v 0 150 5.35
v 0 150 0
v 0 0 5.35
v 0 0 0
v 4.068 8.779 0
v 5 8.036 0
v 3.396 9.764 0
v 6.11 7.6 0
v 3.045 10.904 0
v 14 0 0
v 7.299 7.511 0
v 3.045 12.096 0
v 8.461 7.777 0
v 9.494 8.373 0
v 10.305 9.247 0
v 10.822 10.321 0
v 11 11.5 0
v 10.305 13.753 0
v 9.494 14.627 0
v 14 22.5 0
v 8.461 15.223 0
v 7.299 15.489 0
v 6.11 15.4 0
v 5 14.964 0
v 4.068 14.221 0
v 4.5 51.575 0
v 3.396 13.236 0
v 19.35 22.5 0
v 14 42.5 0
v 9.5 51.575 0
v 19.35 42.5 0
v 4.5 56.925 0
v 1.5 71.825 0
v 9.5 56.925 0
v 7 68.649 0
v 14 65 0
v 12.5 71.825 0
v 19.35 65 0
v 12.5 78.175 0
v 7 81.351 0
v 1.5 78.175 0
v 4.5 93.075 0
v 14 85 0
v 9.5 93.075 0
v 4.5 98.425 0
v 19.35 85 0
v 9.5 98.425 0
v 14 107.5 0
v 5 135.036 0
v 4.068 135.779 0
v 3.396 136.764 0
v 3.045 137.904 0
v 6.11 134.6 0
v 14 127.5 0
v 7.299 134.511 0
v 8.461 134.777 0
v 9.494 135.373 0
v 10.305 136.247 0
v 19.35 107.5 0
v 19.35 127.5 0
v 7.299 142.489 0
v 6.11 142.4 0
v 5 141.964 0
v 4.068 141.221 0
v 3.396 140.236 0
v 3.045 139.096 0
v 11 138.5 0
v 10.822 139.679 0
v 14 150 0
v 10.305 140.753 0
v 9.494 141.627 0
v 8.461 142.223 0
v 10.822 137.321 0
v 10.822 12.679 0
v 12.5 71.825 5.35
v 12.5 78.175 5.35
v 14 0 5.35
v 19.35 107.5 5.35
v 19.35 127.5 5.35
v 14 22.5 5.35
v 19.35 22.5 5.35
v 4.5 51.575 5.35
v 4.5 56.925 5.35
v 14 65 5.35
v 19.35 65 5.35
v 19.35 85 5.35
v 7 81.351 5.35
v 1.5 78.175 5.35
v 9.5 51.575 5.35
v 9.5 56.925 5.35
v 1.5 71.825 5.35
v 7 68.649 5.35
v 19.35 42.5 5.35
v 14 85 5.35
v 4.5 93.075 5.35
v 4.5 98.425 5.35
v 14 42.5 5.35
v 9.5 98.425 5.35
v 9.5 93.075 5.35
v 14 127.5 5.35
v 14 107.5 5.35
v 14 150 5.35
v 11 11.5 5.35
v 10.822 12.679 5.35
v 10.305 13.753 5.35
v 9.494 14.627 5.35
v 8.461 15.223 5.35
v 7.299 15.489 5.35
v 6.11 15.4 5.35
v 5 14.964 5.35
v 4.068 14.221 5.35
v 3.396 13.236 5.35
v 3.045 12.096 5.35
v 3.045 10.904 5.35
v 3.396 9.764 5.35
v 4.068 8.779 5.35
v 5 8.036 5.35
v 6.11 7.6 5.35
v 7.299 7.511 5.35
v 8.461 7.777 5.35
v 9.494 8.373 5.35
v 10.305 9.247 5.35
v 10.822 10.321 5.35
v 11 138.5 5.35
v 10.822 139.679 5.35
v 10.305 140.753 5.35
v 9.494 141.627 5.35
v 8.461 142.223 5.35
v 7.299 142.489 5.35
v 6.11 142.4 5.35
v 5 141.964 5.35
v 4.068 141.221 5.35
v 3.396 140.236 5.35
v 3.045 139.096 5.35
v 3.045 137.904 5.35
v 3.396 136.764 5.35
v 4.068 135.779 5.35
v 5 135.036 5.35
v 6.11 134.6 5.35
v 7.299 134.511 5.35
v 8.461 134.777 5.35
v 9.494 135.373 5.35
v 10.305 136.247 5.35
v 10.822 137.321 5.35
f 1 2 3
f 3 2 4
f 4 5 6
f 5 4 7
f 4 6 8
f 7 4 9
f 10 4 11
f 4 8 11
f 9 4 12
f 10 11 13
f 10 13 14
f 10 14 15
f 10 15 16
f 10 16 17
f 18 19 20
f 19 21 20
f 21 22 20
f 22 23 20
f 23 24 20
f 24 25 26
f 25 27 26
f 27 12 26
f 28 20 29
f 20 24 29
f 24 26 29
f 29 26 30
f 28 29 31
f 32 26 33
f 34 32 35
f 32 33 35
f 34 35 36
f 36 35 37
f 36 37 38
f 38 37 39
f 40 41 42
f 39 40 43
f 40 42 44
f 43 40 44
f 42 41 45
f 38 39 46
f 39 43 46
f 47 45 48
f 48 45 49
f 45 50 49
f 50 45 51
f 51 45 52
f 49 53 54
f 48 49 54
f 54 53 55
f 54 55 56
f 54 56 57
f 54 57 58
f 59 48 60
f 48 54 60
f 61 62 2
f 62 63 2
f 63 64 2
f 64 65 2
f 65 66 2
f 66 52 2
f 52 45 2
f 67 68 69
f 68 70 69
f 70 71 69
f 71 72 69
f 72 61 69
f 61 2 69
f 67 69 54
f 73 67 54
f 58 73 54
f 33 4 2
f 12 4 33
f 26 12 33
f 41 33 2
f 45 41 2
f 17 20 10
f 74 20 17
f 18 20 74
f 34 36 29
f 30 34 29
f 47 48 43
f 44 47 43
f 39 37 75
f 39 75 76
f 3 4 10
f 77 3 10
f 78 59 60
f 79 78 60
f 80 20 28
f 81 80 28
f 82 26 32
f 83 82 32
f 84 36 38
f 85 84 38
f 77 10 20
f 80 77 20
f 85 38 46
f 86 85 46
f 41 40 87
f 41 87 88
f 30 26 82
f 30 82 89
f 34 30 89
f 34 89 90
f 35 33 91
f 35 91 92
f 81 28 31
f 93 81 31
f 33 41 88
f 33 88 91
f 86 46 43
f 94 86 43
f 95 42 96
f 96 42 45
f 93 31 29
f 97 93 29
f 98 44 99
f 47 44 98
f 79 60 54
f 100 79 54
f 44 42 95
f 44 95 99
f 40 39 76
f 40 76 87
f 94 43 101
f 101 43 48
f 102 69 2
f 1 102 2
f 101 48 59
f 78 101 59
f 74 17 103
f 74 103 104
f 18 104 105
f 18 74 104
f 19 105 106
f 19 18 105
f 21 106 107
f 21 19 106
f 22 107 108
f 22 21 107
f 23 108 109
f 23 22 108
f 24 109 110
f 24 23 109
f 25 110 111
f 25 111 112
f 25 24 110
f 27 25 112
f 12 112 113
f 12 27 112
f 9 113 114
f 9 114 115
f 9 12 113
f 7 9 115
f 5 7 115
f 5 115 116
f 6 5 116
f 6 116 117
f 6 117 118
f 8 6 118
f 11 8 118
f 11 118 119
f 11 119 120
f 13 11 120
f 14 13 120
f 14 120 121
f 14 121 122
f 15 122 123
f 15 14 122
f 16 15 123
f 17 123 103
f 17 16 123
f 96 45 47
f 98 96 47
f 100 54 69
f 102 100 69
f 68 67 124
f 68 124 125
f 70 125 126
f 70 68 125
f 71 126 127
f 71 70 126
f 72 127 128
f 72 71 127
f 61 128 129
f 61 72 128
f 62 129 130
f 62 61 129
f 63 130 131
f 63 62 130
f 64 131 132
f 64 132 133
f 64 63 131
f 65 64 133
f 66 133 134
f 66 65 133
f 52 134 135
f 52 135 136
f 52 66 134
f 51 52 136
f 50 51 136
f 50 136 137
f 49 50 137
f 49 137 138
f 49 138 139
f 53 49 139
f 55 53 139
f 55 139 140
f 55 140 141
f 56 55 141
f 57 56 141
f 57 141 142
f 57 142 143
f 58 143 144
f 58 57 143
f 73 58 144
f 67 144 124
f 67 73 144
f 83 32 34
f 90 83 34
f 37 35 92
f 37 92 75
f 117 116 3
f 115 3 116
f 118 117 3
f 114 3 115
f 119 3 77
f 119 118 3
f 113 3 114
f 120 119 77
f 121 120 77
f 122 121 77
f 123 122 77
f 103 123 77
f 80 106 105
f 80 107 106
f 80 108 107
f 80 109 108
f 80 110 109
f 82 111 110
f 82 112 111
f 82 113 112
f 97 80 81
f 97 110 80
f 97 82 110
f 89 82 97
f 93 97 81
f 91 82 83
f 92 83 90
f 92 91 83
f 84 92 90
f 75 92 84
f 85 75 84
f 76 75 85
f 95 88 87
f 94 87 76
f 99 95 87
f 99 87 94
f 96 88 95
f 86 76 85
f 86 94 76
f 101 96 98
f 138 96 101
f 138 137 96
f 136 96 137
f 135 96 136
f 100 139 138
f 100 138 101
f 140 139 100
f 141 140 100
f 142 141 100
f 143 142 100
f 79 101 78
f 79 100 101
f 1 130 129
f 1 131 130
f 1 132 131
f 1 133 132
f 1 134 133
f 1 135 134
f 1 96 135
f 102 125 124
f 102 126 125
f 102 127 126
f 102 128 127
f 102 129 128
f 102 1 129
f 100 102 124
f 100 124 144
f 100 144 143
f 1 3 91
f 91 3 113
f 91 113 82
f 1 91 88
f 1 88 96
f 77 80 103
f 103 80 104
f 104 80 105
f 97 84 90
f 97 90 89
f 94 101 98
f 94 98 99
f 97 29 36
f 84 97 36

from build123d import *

# Parameters (mm, degrees)
MODEL_R             = 4
MODEL_W             = 4.999999889
MODEL_H             = 5.349997431
MODEL_H_2           = 5.350001156
BOSS_EXTRUDE1_DEPTH = 5.35


with BuildPart() as part:
    # Model → Boss-Extrude1 (new body)
    with BuildSketch(Plane.XY):
        Polygon((14.000000432, 127.499997616), (14.000000432, 150.00000596), (0, 150.00000596), (0, 0), (14.000000432, 0), (14.000000432, 22.500000894), (19.349999726, 22.500000894), (19.349999726, 42.500000447), (14.000000432, 42.500000447), (14.000000432, 64.999997616), (19.349999726, 64.999997616), (19.349999726, 85.000000894), (14.000000432, 85.000000894), (14.000000432, 107.500001788), (19.349999726, 107.500001788), (19.349999726, 127.499997616), align=None)
        with Locations((7, 11.5)):
            Circle(MODEL_R, mode=Mode.SUBTRACT)
        with Locations((7, 138.5)):
            Circle(MODEL_R, mode=Mode.SUBTRACT)
        with Locations((6.999999751, 54.250000044)):
            Rectangle(MODEL_W, MODEL_H, mode=Mode.SUBTRACT)
        with Locations((6.999999751, 95.750000328)):
            Rectangle(MODEL_W, MODEL_H_2, mode=Mode.SUBTRACT)
        Polygon((1.500000013, 71.82457298), (7.000000216, 68.649150431), (12.500000186, 71.82457298), (12.500000186, 78.175425529), (7.000000216, 81.350855529), (1.500000013, 78.175425529), align=None, mode=Mode.SUBTRACT)
    extrude(amount=BOSS_EXTRUDE1_DEPTH)


solid = part.part
